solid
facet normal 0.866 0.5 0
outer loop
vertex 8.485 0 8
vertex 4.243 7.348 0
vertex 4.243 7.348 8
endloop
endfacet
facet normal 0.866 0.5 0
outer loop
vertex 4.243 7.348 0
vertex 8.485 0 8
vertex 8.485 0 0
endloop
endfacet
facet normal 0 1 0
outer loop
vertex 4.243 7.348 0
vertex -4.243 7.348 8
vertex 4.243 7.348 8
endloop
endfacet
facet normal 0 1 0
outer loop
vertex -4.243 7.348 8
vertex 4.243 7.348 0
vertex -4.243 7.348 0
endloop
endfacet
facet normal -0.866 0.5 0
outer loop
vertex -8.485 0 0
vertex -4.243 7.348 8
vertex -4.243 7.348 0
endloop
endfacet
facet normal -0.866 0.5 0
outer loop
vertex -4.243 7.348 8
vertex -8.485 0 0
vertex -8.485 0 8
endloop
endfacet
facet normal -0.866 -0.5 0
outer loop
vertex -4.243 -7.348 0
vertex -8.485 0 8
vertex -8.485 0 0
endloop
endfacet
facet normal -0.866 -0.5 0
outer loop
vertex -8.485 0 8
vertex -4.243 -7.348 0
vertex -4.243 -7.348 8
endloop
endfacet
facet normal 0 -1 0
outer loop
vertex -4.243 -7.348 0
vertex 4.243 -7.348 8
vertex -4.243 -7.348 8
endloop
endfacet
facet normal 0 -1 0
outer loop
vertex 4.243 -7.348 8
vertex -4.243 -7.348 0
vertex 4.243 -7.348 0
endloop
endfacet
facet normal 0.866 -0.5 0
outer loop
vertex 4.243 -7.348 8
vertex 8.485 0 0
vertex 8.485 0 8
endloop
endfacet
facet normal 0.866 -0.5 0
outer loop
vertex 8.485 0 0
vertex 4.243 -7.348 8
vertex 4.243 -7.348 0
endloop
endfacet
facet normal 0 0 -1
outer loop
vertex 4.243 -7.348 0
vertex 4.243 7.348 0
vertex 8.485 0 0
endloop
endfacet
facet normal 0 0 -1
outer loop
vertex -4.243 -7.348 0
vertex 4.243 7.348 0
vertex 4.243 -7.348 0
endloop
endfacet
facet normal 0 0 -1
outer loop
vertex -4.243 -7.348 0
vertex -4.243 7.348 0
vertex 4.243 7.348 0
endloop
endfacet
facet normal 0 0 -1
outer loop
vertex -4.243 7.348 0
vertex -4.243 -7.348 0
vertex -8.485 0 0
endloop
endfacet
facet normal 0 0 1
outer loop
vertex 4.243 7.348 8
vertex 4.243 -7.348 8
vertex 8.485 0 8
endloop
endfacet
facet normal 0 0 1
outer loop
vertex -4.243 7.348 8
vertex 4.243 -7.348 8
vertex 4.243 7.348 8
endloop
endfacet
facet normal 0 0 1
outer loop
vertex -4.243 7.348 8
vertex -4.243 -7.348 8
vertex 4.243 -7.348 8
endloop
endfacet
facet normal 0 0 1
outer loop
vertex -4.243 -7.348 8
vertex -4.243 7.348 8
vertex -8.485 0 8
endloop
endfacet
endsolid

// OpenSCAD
// file: bowl.scad
// common constants used across multiple files

// a carton is 211mm long.
// two next to one another are 225mm wide.
// a carton is 250mm tall.


boltd = 5;
wallr = 3;
wallx = 8;
wally = wallr;
wallz = wallr;
mainx = 204;
mainy = 80;
mainz = 211;
totx = mainx + wallx * 2;
totz = mainz + wallz * 2;
toty = mainy + wally;

towerd = 20;
towerw = 18;

bard = 3;

swatchx = 20;
swatchy = 20;
swatchz = 2;

fpanelx = (mainx - towerw) / 2;
clampr = bard / 2 + 0.2;
fpanely = mainy;
fpanelz = 8;
// main file
include <bowl.scad>

$fn=6;

cylinder(fpanelz, sqrt(72), sqrt(72));
